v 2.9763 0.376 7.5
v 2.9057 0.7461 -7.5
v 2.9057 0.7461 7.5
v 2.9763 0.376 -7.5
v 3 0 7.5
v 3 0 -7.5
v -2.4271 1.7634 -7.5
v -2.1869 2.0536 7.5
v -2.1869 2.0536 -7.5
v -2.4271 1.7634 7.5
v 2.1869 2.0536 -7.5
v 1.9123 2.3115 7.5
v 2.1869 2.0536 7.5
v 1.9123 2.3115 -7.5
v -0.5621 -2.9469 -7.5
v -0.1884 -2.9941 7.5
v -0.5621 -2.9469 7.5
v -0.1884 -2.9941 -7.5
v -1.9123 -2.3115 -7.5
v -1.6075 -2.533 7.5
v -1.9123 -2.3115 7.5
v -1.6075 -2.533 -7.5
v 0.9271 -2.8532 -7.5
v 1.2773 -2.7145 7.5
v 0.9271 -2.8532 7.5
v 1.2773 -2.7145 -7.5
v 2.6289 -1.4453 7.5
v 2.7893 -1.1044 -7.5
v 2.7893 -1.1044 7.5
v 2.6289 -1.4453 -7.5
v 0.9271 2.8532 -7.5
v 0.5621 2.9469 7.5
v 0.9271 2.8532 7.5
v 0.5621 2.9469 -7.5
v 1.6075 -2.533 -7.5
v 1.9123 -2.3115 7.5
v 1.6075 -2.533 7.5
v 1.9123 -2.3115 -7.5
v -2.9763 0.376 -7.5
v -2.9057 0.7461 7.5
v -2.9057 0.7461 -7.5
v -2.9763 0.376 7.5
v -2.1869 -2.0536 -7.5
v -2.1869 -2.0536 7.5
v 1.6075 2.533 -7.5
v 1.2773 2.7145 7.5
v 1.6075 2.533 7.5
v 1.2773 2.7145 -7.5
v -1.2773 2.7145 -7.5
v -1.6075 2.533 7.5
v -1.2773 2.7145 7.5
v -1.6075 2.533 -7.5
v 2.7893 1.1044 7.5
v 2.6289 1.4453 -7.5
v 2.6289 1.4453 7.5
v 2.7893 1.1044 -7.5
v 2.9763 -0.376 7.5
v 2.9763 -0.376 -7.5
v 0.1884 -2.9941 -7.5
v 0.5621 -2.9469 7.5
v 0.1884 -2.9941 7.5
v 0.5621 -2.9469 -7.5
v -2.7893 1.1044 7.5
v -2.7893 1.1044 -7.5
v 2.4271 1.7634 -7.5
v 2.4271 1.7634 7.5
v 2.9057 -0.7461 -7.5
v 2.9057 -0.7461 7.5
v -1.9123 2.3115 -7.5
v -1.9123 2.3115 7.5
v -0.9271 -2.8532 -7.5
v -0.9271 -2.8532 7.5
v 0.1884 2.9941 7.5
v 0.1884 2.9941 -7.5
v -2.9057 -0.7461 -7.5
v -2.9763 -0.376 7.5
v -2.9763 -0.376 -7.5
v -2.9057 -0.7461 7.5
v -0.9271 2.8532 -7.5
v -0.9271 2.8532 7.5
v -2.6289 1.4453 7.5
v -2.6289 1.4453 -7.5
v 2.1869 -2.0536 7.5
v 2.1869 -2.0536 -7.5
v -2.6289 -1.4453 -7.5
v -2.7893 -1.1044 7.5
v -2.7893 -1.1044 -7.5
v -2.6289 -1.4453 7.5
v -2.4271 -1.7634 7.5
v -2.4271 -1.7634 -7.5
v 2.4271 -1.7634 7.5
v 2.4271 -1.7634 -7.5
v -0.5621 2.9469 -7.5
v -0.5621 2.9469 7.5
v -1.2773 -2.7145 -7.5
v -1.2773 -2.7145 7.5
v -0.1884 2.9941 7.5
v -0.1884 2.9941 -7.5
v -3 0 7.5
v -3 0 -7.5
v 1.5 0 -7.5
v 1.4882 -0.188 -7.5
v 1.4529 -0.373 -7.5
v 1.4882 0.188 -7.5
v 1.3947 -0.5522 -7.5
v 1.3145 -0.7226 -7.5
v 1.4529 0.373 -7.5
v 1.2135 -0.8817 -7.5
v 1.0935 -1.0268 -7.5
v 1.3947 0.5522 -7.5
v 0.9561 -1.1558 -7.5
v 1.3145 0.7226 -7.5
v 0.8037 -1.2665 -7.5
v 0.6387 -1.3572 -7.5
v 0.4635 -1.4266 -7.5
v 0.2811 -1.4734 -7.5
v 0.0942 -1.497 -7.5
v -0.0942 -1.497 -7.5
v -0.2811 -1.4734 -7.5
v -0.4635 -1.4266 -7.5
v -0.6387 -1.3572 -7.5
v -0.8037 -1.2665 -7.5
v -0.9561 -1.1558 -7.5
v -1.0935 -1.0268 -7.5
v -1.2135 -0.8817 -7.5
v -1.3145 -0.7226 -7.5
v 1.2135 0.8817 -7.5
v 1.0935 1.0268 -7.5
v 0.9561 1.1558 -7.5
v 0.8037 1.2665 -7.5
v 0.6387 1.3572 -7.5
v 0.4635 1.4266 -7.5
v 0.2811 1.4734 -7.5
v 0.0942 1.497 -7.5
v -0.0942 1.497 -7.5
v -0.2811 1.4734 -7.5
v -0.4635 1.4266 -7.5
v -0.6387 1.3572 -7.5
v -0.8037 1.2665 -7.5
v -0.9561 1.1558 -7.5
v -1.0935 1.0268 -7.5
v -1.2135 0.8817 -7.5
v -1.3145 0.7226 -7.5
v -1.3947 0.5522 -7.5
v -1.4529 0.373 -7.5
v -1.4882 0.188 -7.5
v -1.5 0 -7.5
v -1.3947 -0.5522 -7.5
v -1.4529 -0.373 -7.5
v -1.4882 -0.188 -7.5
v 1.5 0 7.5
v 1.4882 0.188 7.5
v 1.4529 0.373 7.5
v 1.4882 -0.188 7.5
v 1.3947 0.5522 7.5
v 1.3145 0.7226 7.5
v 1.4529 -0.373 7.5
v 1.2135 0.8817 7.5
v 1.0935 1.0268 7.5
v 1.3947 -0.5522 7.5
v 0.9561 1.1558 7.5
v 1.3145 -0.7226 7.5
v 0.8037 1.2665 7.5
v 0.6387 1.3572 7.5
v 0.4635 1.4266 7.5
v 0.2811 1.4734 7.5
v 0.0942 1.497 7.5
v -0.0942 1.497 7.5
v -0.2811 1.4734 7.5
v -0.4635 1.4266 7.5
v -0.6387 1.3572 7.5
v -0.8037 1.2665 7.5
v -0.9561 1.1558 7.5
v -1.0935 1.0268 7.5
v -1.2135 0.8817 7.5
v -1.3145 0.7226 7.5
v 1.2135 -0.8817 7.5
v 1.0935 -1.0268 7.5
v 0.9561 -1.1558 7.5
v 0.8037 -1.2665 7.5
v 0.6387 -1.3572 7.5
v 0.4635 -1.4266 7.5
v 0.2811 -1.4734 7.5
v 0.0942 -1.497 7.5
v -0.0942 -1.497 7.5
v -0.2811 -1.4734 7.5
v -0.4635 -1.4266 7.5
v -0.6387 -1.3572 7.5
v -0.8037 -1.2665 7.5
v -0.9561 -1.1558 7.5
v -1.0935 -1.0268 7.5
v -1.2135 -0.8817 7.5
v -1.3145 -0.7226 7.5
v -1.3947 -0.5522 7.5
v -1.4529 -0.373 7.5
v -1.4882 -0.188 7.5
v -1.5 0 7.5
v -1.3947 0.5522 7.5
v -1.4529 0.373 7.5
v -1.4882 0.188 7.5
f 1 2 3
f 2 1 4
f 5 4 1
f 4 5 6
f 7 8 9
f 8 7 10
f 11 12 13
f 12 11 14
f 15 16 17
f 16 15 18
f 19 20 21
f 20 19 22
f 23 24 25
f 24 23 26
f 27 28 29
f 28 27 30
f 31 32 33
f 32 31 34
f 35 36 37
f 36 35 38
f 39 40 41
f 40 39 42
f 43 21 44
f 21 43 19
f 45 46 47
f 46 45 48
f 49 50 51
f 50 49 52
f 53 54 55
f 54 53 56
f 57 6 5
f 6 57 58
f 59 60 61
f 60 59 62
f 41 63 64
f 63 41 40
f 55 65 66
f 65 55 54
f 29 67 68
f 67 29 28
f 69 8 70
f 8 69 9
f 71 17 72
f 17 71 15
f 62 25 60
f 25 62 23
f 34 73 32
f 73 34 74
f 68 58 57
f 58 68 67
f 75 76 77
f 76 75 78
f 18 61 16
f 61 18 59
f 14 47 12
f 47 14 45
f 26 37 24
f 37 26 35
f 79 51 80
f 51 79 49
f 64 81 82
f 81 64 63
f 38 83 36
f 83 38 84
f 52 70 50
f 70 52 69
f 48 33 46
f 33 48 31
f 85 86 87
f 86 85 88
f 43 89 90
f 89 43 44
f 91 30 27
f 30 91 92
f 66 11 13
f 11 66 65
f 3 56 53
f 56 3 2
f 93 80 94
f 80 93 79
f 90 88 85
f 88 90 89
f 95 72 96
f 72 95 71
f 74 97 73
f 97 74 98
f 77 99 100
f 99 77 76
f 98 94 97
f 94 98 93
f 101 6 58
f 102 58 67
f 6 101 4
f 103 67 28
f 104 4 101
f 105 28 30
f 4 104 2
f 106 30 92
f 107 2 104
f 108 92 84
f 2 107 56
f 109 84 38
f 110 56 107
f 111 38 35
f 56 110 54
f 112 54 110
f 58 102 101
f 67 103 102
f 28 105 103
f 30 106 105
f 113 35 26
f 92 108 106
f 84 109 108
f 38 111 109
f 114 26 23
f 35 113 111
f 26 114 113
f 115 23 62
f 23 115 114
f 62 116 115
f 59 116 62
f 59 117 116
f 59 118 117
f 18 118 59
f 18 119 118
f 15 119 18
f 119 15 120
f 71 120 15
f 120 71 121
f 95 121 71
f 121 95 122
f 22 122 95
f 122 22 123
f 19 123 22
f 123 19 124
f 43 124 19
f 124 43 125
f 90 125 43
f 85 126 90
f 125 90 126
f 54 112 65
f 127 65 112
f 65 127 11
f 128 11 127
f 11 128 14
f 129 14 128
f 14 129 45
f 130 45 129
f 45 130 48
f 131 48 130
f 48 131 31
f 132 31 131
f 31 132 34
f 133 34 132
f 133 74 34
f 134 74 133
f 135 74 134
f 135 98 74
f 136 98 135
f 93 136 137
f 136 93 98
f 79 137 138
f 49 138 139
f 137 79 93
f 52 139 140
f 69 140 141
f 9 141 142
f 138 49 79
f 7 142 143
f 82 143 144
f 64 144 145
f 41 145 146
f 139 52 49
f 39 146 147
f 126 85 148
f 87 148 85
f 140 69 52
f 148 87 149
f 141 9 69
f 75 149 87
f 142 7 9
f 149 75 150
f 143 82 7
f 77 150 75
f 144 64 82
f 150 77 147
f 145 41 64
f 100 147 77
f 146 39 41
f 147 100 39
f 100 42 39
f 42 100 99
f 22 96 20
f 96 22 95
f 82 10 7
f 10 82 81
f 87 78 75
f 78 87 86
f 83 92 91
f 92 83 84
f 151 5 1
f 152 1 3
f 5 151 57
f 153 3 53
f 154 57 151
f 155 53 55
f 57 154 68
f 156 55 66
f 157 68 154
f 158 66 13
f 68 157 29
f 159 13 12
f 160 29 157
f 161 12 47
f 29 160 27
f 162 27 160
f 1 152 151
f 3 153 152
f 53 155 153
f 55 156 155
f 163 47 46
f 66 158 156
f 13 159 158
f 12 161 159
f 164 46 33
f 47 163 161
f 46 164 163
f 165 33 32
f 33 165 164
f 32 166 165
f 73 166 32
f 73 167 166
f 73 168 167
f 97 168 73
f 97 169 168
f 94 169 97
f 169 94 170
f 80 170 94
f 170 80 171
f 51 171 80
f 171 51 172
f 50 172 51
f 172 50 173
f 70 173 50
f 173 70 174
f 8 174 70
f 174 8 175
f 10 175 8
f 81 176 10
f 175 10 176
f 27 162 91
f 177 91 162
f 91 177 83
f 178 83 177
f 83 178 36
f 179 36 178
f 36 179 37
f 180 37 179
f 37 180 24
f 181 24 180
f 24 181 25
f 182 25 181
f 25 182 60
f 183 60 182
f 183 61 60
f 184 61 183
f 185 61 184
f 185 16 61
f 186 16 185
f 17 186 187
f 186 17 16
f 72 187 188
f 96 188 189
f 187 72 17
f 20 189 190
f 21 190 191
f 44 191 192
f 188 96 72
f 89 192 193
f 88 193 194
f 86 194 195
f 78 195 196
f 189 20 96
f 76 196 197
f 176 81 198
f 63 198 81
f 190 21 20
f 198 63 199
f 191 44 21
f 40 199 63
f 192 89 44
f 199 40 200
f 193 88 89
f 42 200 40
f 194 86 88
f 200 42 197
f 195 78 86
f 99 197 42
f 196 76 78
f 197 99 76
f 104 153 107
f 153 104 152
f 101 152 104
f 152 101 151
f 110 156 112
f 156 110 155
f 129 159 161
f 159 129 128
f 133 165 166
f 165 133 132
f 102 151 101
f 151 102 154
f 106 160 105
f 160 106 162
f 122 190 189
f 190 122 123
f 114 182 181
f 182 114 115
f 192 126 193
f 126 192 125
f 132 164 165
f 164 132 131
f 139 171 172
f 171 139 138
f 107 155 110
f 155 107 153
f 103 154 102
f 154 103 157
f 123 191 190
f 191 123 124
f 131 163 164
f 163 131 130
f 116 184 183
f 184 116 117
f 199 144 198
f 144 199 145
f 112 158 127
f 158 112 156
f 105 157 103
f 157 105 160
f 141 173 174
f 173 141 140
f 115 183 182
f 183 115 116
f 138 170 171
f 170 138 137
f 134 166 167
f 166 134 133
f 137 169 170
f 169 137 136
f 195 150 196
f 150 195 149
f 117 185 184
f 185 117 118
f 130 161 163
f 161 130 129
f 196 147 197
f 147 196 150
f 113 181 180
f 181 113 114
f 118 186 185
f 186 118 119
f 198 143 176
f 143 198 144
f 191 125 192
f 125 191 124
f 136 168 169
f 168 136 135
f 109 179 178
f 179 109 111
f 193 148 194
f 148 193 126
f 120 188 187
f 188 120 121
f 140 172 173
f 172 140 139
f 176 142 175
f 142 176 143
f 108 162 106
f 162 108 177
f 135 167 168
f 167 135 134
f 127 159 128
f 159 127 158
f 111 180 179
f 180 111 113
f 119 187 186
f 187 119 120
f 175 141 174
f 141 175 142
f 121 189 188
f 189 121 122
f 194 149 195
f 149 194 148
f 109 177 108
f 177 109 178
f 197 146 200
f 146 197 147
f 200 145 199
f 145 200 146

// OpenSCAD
$fn = 50;


difference() {
	union() {
		translate(v = [0, 0, -7.5000000000]) {
			cylinder(h = 15, r = 3.0000000000);
		}
	}
	union() {
		translate(v = [0, 0, -100.0000000000]) {
			cylinder(h = 200, r = 1.5000000000);
		}
	}
}
